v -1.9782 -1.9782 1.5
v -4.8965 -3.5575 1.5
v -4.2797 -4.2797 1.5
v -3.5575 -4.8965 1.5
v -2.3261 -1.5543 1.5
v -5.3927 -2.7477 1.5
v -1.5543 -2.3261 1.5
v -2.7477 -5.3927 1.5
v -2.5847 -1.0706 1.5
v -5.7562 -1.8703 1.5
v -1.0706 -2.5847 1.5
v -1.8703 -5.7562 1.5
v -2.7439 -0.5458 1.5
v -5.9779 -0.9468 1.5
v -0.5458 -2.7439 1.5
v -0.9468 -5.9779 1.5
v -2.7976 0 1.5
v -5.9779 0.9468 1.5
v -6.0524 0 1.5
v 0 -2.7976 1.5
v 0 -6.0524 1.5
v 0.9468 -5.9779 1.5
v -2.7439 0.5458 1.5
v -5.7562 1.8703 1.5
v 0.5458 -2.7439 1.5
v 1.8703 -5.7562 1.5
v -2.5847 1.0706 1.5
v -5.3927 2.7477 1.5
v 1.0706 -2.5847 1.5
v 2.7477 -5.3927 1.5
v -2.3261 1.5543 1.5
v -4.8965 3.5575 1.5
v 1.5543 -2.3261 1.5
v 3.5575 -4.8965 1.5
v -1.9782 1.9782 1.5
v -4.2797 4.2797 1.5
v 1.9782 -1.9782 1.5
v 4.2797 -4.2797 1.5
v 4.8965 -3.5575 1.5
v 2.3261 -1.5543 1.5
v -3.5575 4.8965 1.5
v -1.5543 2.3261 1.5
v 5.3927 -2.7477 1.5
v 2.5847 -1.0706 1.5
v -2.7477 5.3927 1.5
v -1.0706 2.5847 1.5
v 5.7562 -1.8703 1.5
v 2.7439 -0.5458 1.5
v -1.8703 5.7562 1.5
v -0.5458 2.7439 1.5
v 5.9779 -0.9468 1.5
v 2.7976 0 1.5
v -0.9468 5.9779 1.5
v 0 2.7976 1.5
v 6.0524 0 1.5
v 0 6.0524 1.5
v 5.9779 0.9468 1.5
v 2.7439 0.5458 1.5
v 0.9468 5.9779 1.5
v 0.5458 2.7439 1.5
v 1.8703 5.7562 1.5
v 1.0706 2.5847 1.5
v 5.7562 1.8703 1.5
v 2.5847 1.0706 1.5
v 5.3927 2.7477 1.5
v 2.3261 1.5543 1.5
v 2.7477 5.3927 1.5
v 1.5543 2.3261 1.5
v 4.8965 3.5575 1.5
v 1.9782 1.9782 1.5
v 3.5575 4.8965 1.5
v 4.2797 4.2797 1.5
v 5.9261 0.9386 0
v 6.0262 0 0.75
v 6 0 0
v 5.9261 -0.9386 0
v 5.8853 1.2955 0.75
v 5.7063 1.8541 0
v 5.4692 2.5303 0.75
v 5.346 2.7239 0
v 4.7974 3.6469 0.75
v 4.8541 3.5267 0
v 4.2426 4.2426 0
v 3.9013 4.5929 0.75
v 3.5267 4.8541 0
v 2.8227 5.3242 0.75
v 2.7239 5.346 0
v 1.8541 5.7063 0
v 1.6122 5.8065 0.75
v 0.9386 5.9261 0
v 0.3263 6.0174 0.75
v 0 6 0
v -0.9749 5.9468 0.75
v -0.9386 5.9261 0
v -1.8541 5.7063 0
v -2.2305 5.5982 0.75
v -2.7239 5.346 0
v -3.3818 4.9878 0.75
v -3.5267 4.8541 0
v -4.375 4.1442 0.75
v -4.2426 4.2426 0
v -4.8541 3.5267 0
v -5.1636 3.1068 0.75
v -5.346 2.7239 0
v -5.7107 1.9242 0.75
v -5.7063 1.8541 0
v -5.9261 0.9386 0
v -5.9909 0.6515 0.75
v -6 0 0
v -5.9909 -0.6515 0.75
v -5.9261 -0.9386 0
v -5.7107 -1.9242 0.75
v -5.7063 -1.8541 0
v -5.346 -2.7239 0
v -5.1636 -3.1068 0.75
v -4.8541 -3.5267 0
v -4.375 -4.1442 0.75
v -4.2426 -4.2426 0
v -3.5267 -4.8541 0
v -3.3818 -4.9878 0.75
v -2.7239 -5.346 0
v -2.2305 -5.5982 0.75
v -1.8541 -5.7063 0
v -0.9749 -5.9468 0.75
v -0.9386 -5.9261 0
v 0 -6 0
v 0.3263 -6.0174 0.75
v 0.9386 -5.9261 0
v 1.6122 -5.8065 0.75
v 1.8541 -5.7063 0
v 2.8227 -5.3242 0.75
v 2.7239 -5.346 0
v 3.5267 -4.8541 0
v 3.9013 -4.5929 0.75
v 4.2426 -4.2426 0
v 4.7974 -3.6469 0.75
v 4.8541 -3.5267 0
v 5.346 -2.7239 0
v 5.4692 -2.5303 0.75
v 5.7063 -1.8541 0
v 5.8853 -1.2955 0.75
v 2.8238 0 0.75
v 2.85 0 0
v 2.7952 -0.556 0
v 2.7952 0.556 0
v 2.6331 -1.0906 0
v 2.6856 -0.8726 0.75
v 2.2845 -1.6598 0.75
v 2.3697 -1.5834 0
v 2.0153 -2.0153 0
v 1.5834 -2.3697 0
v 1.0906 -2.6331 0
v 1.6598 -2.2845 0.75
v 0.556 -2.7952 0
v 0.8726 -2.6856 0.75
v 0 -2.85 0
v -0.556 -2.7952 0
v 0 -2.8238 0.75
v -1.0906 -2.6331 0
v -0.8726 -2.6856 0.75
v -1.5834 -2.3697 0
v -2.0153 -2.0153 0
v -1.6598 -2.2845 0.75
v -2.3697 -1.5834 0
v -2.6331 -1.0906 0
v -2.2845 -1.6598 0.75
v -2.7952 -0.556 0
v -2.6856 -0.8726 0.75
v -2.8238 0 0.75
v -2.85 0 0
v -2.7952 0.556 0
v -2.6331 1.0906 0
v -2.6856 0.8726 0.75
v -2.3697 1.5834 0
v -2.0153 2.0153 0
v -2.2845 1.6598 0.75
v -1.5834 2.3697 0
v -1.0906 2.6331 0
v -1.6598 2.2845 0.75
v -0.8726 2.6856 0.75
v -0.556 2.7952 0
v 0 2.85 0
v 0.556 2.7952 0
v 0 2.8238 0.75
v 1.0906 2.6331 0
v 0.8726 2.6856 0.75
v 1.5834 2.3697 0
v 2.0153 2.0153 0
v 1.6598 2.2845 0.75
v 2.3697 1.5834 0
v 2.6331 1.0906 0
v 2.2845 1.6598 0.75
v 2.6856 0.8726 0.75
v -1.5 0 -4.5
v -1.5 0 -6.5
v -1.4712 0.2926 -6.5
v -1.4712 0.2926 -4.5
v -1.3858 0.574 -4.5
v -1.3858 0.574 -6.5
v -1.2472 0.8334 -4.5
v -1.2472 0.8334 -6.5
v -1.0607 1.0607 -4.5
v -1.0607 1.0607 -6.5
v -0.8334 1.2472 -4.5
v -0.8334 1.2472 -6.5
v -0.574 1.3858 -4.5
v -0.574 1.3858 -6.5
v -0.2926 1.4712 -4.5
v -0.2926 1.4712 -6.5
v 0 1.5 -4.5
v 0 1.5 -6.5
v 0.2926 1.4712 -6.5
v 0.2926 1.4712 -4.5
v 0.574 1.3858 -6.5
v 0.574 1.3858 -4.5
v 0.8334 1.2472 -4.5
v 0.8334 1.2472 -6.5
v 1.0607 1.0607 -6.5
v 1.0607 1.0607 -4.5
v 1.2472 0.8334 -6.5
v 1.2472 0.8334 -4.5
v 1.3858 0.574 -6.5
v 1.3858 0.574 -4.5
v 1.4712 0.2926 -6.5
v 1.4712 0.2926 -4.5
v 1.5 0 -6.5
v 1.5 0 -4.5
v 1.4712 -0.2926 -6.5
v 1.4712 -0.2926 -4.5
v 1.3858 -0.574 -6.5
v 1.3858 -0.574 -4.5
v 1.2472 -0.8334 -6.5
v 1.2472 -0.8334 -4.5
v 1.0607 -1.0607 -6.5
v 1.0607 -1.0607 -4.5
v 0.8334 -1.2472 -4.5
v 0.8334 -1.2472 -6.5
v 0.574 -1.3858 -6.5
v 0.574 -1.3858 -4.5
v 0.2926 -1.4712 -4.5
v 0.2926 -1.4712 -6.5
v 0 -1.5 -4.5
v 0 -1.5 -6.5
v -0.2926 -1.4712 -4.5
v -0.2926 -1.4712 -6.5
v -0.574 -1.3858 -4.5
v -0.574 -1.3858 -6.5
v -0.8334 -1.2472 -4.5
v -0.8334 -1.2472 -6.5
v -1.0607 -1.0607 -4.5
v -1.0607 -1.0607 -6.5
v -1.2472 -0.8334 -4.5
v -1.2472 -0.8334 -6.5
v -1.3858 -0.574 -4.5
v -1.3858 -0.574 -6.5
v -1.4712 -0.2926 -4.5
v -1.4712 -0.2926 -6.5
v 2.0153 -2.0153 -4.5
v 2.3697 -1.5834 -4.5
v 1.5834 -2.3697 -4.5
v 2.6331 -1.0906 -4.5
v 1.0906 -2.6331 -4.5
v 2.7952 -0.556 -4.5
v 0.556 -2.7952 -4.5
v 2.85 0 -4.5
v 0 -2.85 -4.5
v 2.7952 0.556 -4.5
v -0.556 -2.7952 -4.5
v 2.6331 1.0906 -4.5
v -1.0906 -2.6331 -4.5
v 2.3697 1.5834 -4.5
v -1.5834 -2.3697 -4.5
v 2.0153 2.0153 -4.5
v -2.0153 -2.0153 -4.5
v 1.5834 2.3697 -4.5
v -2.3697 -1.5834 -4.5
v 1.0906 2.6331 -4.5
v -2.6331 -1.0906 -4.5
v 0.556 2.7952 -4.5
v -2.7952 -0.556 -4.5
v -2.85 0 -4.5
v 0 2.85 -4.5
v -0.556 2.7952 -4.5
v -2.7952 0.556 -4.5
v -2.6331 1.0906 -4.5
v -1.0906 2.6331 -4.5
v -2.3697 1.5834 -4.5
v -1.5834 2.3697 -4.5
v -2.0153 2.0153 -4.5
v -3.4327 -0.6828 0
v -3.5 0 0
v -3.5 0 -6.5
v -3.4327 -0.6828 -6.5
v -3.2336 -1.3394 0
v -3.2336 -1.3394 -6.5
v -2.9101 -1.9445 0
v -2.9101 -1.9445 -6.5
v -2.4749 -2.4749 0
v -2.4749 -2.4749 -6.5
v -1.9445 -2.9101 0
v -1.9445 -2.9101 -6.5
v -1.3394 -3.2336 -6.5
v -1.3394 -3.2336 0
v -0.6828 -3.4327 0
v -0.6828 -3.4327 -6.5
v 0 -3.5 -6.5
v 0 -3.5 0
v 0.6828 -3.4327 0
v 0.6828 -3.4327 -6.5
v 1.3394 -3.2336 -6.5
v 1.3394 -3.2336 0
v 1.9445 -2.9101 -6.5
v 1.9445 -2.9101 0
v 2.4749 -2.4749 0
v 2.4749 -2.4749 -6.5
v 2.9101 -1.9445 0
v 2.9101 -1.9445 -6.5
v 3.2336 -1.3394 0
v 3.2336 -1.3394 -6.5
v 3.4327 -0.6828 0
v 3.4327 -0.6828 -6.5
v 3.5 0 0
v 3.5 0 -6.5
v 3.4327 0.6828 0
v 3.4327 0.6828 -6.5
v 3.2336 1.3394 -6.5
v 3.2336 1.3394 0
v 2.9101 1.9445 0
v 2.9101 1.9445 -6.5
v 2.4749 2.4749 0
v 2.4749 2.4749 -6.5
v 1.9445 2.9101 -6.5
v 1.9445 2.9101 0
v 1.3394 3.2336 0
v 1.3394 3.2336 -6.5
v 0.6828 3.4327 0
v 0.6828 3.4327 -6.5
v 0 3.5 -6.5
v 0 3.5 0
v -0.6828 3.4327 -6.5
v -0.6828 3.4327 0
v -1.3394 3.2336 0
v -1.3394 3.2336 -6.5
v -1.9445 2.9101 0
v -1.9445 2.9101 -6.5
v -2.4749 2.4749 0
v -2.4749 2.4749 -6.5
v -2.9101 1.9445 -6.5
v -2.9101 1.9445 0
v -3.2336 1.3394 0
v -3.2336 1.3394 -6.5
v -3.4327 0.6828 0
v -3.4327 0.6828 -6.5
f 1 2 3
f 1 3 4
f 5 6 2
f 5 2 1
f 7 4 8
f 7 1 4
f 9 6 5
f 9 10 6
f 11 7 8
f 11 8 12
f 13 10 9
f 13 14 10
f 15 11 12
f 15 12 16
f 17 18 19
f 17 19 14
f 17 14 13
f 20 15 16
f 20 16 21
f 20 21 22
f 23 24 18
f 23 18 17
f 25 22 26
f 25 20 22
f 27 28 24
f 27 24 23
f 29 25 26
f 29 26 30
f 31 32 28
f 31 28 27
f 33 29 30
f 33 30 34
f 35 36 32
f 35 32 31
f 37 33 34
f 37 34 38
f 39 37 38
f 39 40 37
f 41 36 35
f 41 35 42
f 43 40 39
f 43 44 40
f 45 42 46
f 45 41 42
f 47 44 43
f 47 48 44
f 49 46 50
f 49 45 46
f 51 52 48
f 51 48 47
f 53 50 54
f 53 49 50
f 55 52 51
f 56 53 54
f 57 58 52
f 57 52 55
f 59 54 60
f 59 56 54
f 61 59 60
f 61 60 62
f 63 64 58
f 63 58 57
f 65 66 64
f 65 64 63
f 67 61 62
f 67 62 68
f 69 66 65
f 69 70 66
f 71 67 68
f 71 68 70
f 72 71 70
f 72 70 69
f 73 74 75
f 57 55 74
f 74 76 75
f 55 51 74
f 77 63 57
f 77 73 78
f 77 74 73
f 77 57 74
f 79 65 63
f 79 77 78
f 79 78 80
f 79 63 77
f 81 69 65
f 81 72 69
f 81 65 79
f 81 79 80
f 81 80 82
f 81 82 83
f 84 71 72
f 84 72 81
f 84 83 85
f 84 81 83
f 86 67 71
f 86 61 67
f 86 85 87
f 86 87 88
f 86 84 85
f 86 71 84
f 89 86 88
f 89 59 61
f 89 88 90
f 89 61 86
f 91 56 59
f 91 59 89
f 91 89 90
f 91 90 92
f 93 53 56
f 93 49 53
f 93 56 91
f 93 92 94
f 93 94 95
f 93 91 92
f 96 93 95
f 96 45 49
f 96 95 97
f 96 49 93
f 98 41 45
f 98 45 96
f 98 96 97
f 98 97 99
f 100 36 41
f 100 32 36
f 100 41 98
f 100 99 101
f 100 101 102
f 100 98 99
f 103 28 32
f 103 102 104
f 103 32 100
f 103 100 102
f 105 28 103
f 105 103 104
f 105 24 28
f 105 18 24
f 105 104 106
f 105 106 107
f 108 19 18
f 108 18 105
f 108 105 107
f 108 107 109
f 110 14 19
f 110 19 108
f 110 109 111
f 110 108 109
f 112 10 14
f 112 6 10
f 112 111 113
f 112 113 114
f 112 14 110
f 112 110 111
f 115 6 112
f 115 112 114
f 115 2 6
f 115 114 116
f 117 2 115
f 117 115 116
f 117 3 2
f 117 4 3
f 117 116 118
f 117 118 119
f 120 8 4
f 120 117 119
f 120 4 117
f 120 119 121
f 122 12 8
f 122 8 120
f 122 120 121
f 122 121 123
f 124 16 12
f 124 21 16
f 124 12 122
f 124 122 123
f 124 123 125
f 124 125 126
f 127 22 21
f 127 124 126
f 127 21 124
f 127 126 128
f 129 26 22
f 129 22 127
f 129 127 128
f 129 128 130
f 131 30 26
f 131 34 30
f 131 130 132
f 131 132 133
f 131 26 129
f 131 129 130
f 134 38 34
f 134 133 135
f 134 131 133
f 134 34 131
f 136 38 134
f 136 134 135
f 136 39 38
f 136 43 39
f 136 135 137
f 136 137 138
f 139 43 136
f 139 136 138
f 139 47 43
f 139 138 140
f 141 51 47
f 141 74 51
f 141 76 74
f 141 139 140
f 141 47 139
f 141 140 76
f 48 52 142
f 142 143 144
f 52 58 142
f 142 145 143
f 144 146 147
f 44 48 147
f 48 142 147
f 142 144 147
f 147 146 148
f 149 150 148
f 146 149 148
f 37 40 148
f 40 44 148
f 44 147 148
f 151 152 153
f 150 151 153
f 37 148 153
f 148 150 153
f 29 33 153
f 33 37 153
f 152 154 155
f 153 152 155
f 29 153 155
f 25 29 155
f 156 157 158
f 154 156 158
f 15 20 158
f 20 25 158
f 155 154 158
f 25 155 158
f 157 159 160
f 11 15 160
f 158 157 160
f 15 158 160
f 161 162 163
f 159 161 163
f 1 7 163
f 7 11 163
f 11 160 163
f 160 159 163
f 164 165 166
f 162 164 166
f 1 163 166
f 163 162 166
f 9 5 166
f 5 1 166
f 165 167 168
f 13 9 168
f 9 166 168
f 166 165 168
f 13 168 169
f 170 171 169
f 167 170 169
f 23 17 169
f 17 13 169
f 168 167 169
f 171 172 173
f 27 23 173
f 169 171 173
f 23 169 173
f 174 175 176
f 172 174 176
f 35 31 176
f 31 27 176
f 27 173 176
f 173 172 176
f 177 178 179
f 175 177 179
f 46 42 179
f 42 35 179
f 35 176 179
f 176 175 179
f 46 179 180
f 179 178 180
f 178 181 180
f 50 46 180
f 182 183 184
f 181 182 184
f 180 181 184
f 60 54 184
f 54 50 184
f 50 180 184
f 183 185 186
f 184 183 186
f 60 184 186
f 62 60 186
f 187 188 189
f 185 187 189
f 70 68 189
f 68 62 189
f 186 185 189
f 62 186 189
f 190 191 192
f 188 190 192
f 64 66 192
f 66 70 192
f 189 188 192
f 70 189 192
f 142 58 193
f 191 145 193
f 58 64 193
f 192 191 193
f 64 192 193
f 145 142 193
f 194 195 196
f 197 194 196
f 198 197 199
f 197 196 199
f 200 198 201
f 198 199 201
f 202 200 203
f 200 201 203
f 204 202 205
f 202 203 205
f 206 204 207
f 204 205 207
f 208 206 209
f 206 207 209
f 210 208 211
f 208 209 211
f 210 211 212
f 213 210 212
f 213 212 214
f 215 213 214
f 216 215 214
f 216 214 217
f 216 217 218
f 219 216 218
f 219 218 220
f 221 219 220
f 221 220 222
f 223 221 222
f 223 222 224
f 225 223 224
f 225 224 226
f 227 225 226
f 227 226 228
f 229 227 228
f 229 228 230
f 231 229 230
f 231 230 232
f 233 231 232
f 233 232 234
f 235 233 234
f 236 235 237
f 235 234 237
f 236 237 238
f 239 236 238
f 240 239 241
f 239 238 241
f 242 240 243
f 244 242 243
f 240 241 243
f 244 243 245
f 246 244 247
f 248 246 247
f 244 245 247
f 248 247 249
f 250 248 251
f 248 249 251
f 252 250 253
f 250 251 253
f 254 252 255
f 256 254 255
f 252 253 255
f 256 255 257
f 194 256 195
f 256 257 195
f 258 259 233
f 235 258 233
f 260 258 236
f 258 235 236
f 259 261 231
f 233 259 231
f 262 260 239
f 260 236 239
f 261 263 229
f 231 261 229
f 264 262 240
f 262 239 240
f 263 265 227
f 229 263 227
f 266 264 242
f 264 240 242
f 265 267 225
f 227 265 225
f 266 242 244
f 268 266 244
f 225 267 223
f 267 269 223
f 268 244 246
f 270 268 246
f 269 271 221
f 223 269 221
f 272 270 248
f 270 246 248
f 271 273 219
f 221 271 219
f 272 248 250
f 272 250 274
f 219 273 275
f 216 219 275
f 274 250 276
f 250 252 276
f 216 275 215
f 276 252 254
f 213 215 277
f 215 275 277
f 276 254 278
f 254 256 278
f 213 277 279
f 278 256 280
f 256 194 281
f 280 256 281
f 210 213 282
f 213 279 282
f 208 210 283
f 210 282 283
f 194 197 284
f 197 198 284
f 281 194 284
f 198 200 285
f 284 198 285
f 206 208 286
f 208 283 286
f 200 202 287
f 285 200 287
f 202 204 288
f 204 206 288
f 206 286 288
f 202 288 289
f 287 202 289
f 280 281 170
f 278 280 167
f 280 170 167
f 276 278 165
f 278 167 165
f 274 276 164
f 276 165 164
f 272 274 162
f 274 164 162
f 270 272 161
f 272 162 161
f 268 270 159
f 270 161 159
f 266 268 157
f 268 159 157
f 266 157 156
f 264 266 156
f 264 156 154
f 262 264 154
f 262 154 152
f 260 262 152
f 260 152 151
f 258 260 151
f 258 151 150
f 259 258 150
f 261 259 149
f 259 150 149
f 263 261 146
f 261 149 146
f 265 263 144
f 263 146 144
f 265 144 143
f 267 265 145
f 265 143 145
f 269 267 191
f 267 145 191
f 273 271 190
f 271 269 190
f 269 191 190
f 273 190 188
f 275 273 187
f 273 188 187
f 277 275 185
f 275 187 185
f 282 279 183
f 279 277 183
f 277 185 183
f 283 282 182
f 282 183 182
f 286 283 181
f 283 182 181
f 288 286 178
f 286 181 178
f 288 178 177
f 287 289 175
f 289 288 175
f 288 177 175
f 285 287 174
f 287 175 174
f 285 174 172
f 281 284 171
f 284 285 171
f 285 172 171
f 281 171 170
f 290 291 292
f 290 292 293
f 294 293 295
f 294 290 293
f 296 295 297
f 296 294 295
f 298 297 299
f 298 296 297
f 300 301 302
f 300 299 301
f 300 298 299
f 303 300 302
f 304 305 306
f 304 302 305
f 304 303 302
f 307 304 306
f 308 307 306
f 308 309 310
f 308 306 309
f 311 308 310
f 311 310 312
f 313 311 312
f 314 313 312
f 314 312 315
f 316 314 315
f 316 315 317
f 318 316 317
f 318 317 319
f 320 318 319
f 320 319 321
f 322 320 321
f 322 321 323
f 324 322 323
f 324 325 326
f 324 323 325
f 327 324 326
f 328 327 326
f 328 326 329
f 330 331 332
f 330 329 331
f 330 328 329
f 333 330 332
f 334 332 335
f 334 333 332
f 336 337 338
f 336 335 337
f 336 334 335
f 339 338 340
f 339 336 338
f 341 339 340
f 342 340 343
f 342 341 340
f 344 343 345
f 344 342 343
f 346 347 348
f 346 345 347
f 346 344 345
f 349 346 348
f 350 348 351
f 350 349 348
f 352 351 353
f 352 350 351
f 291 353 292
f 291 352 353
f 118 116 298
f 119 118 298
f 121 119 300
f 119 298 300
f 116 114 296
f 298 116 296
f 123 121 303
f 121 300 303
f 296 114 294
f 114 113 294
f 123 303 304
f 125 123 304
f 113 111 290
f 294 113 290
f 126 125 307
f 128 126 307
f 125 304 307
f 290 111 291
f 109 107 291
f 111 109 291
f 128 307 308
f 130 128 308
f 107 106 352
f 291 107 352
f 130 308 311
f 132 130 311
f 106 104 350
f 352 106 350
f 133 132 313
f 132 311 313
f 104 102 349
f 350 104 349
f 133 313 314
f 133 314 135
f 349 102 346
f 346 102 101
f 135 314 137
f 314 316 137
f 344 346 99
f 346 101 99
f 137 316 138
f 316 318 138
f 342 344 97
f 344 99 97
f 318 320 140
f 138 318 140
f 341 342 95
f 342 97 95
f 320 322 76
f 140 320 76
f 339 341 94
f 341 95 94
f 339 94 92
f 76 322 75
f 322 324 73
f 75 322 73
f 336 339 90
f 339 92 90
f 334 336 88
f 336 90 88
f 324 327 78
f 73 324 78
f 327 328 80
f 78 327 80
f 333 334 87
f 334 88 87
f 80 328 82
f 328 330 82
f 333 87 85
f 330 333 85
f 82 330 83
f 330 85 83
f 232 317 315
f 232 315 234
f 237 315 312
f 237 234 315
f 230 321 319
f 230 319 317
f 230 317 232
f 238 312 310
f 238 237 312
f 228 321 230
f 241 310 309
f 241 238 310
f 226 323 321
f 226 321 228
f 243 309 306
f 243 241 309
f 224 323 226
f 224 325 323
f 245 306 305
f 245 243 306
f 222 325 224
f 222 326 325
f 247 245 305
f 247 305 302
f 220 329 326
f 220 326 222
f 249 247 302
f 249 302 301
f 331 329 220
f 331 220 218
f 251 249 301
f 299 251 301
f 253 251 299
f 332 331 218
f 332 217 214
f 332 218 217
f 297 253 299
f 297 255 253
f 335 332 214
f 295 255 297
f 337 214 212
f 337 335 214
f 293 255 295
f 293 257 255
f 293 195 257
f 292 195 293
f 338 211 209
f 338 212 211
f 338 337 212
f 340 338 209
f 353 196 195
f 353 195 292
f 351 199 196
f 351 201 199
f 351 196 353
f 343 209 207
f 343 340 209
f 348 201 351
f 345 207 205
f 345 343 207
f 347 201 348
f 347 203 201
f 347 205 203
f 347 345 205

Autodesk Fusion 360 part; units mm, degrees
sketch "Sketch1" plane through (0, 0, 0) normal (0, 0, 1) x (1, 0, 0)
  circle A0 centre (0, 0) radius 6
  circle A1 centre (0, 0) radius 2.85
  dimension "d1" = 12
  dimension "d2" = 5.7
extrude "Extrude1" add sketch "Sketch1" along normal blind 1.5 draft 2
sketch "Sketch2" plane through (0, 0, 0) normal (0, 0, -1) x (-1, 0, 0)
  circle A0 centre (0, 0) radius 2.85
  circle A1 centre (0, 0) radius 6
  circle A2 centre (0, 0) radius 3.5
  dimension "d5" = 7
extrude "Extrude2" add sketch "Sketch2" along normal blind 6.5 contours A2
sketch "Sketch3" plane through (0, 0, -6.5) normal (0, 0, -1) x (-1, 0, 0)
  circle A0 centre (0, 0) radius 2.85
  circle A1 centre (0, 0) radius 3.5
  circle A2 centre (0, 0) radius 3.5
  circle A3 centre (0, 0) radius 1.5
  dimension "d8" = 3
extrude "Extrude3" add sketch "Sketch3" against normal blind 2 contours A0
